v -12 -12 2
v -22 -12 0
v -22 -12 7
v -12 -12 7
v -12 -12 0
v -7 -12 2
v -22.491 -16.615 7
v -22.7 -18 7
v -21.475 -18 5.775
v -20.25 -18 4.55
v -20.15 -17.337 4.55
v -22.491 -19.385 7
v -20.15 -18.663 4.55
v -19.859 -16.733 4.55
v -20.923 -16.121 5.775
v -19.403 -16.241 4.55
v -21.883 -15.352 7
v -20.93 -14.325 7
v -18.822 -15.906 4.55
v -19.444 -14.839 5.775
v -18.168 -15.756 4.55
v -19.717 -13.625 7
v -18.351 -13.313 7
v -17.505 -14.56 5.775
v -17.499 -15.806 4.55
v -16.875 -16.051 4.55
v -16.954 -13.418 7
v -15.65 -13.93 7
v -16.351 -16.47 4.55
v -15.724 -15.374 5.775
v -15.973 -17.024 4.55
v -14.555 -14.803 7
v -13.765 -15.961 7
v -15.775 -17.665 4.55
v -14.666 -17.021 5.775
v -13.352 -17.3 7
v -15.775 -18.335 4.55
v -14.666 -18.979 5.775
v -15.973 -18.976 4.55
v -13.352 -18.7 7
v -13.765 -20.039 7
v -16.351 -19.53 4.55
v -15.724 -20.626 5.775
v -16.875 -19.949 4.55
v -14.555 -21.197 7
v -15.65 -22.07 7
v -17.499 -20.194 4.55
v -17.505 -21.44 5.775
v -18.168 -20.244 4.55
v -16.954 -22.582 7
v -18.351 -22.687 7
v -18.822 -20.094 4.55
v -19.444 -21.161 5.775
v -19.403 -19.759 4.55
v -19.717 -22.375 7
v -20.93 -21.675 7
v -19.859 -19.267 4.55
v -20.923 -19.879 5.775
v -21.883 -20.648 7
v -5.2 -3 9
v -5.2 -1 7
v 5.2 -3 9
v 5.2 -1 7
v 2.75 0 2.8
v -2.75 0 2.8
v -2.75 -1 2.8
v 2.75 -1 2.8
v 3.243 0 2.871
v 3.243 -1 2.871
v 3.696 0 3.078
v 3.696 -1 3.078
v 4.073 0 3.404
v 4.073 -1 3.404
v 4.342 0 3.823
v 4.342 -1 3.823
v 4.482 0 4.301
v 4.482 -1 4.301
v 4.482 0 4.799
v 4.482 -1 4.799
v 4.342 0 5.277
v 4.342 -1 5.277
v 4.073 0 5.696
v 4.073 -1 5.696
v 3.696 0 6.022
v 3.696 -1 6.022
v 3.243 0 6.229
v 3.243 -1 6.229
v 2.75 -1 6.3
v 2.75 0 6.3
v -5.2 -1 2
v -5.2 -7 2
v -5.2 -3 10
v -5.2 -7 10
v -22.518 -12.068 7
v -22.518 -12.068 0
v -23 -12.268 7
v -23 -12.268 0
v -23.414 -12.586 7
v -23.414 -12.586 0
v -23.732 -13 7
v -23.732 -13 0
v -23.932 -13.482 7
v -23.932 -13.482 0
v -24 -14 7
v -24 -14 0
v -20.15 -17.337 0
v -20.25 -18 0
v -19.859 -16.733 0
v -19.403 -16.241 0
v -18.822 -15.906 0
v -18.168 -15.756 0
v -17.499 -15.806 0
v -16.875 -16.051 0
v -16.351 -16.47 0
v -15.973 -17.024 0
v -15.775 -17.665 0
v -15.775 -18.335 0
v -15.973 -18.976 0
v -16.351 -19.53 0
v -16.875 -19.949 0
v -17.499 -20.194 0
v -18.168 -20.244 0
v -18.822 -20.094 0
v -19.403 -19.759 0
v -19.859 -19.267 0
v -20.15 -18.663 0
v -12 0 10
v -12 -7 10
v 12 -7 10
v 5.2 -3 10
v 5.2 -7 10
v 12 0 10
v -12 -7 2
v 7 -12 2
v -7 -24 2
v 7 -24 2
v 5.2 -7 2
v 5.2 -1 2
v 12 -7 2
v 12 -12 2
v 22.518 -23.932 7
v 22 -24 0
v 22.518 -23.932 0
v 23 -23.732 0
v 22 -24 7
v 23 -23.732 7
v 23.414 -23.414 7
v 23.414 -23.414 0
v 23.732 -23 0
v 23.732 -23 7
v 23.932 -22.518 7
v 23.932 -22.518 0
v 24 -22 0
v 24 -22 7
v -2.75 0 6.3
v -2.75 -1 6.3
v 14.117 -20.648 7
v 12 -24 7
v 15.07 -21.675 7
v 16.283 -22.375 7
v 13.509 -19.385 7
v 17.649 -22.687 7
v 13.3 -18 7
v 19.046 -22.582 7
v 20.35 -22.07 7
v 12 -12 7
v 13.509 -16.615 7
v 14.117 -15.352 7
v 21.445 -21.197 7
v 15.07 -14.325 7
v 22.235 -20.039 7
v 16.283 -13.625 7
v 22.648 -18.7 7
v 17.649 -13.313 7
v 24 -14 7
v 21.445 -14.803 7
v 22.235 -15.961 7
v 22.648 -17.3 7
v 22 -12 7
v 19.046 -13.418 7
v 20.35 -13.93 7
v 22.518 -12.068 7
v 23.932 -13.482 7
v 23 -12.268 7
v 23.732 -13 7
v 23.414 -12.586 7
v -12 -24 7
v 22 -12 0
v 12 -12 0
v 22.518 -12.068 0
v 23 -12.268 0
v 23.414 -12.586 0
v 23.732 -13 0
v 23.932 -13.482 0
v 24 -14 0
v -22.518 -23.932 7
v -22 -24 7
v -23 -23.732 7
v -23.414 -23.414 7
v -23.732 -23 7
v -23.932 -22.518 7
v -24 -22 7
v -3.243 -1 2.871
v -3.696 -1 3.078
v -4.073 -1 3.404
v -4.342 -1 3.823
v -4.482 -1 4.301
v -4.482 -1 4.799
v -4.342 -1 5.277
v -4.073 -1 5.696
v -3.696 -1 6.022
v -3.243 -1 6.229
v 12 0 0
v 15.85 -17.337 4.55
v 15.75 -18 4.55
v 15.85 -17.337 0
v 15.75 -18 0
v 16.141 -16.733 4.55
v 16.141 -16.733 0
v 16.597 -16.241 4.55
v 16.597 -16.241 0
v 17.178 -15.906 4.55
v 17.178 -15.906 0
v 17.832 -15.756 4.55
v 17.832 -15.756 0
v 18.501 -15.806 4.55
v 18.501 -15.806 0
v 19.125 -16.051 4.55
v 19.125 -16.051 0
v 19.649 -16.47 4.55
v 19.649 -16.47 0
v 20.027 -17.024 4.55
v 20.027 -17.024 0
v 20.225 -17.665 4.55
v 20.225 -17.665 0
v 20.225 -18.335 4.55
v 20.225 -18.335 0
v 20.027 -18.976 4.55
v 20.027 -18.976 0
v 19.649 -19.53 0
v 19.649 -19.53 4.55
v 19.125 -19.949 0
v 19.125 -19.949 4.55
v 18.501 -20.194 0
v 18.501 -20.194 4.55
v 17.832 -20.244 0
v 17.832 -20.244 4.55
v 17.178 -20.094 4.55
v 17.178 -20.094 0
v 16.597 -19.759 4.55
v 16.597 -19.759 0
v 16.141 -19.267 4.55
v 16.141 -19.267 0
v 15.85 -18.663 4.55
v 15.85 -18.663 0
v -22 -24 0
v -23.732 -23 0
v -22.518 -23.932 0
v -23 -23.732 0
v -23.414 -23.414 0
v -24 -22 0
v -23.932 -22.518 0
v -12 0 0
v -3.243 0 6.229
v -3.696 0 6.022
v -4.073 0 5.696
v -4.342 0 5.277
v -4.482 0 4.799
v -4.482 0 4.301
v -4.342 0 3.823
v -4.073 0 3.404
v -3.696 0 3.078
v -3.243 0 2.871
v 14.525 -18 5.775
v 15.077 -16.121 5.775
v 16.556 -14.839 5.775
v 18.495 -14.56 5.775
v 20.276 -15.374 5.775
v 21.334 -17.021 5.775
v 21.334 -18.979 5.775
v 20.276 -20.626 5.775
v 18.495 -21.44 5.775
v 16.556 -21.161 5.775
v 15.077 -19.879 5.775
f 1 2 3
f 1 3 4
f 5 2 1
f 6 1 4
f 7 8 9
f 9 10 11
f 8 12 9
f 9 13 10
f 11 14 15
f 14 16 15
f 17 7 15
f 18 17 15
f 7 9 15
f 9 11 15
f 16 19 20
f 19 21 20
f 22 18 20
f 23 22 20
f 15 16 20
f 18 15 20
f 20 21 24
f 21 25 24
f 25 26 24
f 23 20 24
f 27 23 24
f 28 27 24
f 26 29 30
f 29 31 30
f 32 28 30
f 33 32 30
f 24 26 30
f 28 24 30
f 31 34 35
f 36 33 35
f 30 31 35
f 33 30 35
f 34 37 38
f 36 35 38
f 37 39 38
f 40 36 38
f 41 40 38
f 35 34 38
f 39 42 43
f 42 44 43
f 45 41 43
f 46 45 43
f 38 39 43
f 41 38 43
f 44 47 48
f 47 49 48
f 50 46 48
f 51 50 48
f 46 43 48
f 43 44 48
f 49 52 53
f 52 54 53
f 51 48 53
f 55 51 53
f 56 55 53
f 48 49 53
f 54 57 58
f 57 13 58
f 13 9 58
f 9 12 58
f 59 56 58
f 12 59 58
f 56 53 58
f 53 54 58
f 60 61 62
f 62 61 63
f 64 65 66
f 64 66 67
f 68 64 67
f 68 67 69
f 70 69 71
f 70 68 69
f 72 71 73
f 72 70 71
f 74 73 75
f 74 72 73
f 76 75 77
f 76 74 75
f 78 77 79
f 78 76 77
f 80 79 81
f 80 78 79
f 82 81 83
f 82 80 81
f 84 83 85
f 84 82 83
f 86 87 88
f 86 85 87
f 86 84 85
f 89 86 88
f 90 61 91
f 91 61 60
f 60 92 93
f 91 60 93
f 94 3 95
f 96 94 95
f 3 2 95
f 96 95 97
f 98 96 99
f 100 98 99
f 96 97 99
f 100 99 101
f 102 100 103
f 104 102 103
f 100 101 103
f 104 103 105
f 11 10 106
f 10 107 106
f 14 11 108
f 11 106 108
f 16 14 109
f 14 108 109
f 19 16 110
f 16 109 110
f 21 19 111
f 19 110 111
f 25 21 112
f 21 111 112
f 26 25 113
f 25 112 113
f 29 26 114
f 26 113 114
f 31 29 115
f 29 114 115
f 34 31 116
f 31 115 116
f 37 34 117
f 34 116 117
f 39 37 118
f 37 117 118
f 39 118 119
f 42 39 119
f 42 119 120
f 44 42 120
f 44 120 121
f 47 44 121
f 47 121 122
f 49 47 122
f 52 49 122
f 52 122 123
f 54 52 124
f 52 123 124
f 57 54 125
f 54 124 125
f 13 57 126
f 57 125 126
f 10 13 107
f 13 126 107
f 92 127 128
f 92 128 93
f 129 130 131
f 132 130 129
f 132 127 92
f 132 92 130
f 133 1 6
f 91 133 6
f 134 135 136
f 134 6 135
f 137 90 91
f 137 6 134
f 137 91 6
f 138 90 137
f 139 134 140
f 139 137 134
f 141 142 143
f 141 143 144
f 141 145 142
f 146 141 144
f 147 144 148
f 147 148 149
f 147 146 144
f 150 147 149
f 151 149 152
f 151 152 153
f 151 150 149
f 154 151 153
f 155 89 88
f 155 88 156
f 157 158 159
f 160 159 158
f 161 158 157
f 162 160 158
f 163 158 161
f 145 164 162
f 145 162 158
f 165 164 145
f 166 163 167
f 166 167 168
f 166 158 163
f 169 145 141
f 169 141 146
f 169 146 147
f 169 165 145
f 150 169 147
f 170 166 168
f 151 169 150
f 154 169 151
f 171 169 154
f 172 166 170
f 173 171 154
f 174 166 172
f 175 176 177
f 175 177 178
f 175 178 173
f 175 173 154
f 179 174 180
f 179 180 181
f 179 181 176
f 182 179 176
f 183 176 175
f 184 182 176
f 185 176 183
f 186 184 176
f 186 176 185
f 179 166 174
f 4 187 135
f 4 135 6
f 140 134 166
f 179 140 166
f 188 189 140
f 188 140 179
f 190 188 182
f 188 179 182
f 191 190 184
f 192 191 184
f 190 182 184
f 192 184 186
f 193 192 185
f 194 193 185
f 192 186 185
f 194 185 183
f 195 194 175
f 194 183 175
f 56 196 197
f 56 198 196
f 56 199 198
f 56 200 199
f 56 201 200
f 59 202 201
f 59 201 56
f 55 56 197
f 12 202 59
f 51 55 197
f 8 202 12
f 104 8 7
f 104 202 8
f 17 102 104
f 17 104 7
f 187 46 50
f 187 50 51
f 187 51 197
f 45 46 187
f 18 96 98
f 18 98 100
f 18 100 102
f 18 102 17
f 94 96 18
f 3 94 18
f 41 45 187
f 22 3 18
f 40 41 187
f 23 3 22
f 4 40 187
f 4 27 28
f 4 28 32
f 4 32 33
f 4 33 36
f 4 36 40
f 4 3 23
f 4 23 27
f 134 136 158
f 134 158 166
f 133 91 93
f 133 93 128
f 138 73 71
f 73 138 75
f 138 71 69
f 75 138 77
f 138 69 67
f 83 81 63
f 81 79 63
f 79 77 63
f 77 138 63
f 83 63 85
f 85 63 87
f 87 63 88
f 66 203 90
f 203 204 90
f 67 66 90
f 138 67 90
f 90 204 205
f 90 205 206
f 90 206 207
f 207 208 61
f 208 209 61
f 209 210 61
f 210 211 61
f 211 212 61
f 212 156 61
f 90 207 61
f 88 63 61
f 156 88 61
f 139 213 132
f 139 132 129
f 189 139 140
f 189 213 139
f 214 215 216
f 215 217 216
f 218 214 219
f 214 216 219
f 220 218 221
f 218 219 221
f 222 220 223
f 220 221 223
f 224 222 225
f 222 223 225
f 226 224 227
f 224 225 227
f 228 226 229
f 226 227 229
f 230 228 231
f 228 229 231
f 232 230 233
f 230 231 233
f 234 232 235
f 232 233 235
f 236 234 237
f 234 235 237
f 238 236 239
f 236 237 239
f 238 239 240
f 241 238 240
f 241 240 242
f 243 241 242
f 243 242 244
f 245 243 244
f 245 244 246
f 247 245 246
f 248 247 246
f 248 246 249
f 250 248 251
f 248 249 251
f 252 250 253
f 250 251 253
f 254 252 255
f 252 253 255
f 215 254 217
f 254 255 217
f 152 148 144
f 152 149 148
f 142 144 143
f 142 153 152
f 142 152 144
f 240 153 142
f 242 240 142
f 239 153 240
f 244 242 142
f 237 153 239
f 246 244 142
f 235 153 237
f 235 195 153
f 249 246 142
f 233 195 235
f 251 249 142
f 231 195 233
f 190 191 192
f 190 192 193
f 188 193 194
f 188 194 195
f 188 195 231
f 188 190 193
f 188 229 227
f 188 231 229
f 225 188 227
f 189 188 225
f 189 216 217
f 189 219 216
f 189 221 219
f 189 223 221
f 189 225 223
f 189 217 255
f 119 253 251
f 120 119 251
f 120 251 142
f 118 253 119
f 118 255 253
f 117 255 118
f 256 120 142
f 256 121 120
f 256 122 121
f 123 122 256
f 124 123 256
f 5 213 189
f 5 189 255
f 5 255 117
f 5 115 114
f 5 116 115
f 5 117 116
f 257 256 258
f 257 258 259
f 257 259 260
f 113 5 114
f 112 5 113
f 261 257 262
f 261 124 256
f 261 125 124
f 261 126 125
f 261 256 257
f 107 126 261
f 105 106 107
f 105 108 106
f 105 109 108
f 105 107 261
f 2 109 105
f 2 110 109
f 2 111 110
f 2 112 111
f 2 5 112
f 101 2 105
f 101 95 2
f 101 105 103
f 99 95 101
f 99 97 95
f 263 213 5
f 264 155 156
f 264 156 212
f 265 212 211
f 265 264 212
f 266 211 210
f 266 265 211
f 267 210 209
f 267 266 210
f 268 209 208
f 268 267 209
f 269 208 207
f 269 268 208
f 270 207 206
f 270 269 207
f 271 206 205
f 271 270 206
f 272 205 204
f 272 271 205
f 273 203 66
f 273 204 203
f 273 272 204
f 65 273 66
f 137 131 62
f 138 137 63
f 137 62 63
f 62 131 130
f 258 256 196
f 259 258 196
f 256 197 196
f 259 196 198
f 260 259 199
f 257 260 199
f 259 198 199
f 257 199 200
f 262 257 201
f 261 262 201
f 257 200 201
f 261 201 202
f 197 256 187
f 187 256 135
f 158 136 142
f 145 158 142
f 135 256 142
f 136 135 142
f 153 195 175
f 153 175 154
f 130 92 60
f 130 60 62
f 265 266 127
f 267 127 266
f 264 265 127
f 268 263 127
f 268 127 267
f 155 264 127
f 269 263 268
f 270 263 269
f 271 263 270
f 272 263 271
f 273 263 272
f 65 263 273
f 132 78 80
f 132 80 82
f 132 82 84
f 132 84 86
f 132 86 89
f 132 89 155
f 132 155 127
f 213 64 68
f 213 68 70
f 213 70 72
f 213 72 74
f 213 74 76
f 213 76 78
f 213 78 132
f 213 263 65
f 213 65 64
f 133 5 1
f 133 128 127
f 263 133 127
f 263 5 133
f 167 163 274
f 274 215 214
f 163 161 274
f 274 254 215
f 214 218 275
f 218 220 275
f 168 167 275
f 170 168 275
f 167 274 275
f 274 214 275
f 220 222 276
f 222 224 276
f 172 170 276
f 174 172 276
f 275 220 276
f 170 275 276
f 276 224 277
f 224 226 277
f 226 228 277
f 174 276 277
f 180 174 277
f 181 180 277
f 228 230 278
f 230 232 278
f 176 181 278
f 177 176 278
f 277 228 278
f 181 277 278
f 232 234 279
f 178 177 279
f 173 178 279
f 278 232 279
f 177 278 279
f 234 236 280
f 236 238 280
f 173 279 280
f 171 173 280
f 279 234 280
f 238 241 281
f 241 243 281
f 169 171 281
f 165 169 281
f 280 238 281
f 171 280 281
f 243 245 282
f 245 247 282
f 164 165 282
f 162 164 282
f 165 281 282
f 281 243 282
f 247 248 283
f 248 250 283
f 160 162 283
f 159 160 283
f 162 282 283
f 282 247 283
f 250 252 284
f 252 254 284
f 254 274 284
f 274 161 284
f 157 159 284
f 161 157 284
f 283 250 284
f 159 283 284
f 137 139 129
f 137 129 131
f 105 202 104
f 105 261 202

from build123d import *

# Parameters (mm, degrees)
AUFSATZ_LINEAR_AUSTRAGEN1_DEPTH                      = 10
SCHNITT_LINEAR_AUSTRAGEN1_DEPTH                      = 8
SCHNITT_LINEAR_AUSTRAGEN2_DEPTH                      = 6
SKIZZE4_W                                            = 12
SKIZZE4_H                                            = 12
AUFSATZ_LINEAR_AUSTRAGEN2_DEPTH                      = 5
FASE1_SIZE                                           = 5
FORMSENKUNG_F_R_M4_LINSENSENKSCHRAUBE_MI_D           = 4.5
FORMSENKUNG_F_R_M4_LINSENSENKSCHRAUBE_MI_CSINK_D     = 9.4
FORMSENKUNG_F_R_M4_LINSENSENKSCHRAUBE_MI_CSINK_ANGLE = 90
VERRUNDUNG1_R                                        = 2
SKIZZE8_W                                            = 10.4
SKIZZE8_H                                            = 2
AUFSATZ_LINEAR_AUSTRAGEN3_DEPTH                      = 1
FASE2_SIZE                                           = 2


with BuildPart() as part:
    # Skizze1 → Aufsatz-Linear austragen1 (new body)
    with BuildSketch(Plane.XY):
        Polygon((-12, 0), (12, 0), (12, -12), (24, -12), (24, -24), (-24, -24), (-24, -12), (-12, -12), align=None)
    extrude(amount=AUFSATZ_LINEAR_AUSTRAGEN1_DEPTH)

    # Skizze2 → Schnitt-Linear austragen1 (cut)
    with BuildSketch(Plane.XY.offset(10)):
        Polygon((-5.2, -1), (-5.2, -7), (-24, -7), (-24, -24), (24, -24), (24, -7), (5.2, -7), (5.2, -1), align=None)
    extrude(amount=-SCHNITT_LINEAR_AUSTRAGEN1_DEPTH, mode=Mode.SUBTRACT)

    # Skizze3 → Schnitt-Linear austragen2 (cut)
    with BuildSketch(Plane(origin=(0, 0, 0), x_dir=(1, 0, 0), z_dir=(0, 1, 0))):
        with BuildLine():
            Line((-2.75, -2.8), (2.75, -2.8))
            ThreePointArc((2.75, -2.8), (4.5, -4.55), (2.75, -6.3))
            Line((2.75, -6.3), (-2.75, -6.3))
            ThreePointArc((-2.75, -6.3), (-4.5, -4.55), (-2.75, -2.8))
        make_face()
    extrude(amount=-SCHNITT_LINEAR_AUSTRAGEN2_DEPTH, mode=Mode.SUBTRACT)

    # Skizze4 → Aufsatz-Linear austragen2 (add)
    with BuildSketch(Plane.XY.offset(2)):
        with Locations((-18, -18)):
            Rectangle(SKIZZE4_W, SKIZZE4_H)
        with Locations((18, -18)):
            Rectangle(SKIZZE4_W, SKIZZE4_H)
    extrude(amount=AUFSATZ_LINEAR_AUSTRAGEN2_DEPTH)

    # Fase1
    fase1_edges = [part.edges().sort_by_distance(p)[0] for p in [
        (12, -18, 2),
        (-12, -18, 2),
    ]]
    chamfer(fase1_edges, length=FASE1_SIZE - 0.0001)  # a hair under: the kernel refuses the full size

    # Formsenkung für M4 Linsensenkschraube mit Schlitz1 (through all)
    with Locations(Plane.XY.offset(7)):
        with Locations((-18, -18), (18, -18)):
            CounterSinkHole(FORMSENKUNG_F_R_M4_LINSENSENKSCHRAUBE_MI_D / 2, FORMSENKUNG_F_R_M4_LINSENSENKSCHRAUBE_MI_CSINK_D / 2, counter_sink_angle=FORMSENKUNG_F_R_M4_LINSENSENKSCHRAUBE_MI_CSINK_ANGLE)

    # Verrundung1
    verrundung1_edges = [part.edges().sort_by_distance(p)[0] for p in [
        (24, -12, 3.5),
        (24, -24, 3.5),
        (-24, -24, 3.5),
        (-24, -12, 3.5),
    ]]
    fillet(verrundung1_edges, radius=VERRUNDUNG1_R)

    # Skizze8 → Aufsatz-Linear austragen3 (add)
    with BuildSketch(Plane.XY.offset(10)):
        with Locations((0, -2)):
            Rectangle(SKIZZE8_W, SKIZZE8_H)
    extrude(amount=-AUFSATZ_LINEAR_AUSTRAGEN3_DEPTH)

    # Fase2
    fase2_edges = [part.edges().sort_by_distance(p)[0] for p in [
        (0, -1, 9),
    ]]
    chamfer(fase2_edges, length=FASE2_SIZE - 0.0001)  # a hair under: the kernel refuses the full size


solid = part.part
